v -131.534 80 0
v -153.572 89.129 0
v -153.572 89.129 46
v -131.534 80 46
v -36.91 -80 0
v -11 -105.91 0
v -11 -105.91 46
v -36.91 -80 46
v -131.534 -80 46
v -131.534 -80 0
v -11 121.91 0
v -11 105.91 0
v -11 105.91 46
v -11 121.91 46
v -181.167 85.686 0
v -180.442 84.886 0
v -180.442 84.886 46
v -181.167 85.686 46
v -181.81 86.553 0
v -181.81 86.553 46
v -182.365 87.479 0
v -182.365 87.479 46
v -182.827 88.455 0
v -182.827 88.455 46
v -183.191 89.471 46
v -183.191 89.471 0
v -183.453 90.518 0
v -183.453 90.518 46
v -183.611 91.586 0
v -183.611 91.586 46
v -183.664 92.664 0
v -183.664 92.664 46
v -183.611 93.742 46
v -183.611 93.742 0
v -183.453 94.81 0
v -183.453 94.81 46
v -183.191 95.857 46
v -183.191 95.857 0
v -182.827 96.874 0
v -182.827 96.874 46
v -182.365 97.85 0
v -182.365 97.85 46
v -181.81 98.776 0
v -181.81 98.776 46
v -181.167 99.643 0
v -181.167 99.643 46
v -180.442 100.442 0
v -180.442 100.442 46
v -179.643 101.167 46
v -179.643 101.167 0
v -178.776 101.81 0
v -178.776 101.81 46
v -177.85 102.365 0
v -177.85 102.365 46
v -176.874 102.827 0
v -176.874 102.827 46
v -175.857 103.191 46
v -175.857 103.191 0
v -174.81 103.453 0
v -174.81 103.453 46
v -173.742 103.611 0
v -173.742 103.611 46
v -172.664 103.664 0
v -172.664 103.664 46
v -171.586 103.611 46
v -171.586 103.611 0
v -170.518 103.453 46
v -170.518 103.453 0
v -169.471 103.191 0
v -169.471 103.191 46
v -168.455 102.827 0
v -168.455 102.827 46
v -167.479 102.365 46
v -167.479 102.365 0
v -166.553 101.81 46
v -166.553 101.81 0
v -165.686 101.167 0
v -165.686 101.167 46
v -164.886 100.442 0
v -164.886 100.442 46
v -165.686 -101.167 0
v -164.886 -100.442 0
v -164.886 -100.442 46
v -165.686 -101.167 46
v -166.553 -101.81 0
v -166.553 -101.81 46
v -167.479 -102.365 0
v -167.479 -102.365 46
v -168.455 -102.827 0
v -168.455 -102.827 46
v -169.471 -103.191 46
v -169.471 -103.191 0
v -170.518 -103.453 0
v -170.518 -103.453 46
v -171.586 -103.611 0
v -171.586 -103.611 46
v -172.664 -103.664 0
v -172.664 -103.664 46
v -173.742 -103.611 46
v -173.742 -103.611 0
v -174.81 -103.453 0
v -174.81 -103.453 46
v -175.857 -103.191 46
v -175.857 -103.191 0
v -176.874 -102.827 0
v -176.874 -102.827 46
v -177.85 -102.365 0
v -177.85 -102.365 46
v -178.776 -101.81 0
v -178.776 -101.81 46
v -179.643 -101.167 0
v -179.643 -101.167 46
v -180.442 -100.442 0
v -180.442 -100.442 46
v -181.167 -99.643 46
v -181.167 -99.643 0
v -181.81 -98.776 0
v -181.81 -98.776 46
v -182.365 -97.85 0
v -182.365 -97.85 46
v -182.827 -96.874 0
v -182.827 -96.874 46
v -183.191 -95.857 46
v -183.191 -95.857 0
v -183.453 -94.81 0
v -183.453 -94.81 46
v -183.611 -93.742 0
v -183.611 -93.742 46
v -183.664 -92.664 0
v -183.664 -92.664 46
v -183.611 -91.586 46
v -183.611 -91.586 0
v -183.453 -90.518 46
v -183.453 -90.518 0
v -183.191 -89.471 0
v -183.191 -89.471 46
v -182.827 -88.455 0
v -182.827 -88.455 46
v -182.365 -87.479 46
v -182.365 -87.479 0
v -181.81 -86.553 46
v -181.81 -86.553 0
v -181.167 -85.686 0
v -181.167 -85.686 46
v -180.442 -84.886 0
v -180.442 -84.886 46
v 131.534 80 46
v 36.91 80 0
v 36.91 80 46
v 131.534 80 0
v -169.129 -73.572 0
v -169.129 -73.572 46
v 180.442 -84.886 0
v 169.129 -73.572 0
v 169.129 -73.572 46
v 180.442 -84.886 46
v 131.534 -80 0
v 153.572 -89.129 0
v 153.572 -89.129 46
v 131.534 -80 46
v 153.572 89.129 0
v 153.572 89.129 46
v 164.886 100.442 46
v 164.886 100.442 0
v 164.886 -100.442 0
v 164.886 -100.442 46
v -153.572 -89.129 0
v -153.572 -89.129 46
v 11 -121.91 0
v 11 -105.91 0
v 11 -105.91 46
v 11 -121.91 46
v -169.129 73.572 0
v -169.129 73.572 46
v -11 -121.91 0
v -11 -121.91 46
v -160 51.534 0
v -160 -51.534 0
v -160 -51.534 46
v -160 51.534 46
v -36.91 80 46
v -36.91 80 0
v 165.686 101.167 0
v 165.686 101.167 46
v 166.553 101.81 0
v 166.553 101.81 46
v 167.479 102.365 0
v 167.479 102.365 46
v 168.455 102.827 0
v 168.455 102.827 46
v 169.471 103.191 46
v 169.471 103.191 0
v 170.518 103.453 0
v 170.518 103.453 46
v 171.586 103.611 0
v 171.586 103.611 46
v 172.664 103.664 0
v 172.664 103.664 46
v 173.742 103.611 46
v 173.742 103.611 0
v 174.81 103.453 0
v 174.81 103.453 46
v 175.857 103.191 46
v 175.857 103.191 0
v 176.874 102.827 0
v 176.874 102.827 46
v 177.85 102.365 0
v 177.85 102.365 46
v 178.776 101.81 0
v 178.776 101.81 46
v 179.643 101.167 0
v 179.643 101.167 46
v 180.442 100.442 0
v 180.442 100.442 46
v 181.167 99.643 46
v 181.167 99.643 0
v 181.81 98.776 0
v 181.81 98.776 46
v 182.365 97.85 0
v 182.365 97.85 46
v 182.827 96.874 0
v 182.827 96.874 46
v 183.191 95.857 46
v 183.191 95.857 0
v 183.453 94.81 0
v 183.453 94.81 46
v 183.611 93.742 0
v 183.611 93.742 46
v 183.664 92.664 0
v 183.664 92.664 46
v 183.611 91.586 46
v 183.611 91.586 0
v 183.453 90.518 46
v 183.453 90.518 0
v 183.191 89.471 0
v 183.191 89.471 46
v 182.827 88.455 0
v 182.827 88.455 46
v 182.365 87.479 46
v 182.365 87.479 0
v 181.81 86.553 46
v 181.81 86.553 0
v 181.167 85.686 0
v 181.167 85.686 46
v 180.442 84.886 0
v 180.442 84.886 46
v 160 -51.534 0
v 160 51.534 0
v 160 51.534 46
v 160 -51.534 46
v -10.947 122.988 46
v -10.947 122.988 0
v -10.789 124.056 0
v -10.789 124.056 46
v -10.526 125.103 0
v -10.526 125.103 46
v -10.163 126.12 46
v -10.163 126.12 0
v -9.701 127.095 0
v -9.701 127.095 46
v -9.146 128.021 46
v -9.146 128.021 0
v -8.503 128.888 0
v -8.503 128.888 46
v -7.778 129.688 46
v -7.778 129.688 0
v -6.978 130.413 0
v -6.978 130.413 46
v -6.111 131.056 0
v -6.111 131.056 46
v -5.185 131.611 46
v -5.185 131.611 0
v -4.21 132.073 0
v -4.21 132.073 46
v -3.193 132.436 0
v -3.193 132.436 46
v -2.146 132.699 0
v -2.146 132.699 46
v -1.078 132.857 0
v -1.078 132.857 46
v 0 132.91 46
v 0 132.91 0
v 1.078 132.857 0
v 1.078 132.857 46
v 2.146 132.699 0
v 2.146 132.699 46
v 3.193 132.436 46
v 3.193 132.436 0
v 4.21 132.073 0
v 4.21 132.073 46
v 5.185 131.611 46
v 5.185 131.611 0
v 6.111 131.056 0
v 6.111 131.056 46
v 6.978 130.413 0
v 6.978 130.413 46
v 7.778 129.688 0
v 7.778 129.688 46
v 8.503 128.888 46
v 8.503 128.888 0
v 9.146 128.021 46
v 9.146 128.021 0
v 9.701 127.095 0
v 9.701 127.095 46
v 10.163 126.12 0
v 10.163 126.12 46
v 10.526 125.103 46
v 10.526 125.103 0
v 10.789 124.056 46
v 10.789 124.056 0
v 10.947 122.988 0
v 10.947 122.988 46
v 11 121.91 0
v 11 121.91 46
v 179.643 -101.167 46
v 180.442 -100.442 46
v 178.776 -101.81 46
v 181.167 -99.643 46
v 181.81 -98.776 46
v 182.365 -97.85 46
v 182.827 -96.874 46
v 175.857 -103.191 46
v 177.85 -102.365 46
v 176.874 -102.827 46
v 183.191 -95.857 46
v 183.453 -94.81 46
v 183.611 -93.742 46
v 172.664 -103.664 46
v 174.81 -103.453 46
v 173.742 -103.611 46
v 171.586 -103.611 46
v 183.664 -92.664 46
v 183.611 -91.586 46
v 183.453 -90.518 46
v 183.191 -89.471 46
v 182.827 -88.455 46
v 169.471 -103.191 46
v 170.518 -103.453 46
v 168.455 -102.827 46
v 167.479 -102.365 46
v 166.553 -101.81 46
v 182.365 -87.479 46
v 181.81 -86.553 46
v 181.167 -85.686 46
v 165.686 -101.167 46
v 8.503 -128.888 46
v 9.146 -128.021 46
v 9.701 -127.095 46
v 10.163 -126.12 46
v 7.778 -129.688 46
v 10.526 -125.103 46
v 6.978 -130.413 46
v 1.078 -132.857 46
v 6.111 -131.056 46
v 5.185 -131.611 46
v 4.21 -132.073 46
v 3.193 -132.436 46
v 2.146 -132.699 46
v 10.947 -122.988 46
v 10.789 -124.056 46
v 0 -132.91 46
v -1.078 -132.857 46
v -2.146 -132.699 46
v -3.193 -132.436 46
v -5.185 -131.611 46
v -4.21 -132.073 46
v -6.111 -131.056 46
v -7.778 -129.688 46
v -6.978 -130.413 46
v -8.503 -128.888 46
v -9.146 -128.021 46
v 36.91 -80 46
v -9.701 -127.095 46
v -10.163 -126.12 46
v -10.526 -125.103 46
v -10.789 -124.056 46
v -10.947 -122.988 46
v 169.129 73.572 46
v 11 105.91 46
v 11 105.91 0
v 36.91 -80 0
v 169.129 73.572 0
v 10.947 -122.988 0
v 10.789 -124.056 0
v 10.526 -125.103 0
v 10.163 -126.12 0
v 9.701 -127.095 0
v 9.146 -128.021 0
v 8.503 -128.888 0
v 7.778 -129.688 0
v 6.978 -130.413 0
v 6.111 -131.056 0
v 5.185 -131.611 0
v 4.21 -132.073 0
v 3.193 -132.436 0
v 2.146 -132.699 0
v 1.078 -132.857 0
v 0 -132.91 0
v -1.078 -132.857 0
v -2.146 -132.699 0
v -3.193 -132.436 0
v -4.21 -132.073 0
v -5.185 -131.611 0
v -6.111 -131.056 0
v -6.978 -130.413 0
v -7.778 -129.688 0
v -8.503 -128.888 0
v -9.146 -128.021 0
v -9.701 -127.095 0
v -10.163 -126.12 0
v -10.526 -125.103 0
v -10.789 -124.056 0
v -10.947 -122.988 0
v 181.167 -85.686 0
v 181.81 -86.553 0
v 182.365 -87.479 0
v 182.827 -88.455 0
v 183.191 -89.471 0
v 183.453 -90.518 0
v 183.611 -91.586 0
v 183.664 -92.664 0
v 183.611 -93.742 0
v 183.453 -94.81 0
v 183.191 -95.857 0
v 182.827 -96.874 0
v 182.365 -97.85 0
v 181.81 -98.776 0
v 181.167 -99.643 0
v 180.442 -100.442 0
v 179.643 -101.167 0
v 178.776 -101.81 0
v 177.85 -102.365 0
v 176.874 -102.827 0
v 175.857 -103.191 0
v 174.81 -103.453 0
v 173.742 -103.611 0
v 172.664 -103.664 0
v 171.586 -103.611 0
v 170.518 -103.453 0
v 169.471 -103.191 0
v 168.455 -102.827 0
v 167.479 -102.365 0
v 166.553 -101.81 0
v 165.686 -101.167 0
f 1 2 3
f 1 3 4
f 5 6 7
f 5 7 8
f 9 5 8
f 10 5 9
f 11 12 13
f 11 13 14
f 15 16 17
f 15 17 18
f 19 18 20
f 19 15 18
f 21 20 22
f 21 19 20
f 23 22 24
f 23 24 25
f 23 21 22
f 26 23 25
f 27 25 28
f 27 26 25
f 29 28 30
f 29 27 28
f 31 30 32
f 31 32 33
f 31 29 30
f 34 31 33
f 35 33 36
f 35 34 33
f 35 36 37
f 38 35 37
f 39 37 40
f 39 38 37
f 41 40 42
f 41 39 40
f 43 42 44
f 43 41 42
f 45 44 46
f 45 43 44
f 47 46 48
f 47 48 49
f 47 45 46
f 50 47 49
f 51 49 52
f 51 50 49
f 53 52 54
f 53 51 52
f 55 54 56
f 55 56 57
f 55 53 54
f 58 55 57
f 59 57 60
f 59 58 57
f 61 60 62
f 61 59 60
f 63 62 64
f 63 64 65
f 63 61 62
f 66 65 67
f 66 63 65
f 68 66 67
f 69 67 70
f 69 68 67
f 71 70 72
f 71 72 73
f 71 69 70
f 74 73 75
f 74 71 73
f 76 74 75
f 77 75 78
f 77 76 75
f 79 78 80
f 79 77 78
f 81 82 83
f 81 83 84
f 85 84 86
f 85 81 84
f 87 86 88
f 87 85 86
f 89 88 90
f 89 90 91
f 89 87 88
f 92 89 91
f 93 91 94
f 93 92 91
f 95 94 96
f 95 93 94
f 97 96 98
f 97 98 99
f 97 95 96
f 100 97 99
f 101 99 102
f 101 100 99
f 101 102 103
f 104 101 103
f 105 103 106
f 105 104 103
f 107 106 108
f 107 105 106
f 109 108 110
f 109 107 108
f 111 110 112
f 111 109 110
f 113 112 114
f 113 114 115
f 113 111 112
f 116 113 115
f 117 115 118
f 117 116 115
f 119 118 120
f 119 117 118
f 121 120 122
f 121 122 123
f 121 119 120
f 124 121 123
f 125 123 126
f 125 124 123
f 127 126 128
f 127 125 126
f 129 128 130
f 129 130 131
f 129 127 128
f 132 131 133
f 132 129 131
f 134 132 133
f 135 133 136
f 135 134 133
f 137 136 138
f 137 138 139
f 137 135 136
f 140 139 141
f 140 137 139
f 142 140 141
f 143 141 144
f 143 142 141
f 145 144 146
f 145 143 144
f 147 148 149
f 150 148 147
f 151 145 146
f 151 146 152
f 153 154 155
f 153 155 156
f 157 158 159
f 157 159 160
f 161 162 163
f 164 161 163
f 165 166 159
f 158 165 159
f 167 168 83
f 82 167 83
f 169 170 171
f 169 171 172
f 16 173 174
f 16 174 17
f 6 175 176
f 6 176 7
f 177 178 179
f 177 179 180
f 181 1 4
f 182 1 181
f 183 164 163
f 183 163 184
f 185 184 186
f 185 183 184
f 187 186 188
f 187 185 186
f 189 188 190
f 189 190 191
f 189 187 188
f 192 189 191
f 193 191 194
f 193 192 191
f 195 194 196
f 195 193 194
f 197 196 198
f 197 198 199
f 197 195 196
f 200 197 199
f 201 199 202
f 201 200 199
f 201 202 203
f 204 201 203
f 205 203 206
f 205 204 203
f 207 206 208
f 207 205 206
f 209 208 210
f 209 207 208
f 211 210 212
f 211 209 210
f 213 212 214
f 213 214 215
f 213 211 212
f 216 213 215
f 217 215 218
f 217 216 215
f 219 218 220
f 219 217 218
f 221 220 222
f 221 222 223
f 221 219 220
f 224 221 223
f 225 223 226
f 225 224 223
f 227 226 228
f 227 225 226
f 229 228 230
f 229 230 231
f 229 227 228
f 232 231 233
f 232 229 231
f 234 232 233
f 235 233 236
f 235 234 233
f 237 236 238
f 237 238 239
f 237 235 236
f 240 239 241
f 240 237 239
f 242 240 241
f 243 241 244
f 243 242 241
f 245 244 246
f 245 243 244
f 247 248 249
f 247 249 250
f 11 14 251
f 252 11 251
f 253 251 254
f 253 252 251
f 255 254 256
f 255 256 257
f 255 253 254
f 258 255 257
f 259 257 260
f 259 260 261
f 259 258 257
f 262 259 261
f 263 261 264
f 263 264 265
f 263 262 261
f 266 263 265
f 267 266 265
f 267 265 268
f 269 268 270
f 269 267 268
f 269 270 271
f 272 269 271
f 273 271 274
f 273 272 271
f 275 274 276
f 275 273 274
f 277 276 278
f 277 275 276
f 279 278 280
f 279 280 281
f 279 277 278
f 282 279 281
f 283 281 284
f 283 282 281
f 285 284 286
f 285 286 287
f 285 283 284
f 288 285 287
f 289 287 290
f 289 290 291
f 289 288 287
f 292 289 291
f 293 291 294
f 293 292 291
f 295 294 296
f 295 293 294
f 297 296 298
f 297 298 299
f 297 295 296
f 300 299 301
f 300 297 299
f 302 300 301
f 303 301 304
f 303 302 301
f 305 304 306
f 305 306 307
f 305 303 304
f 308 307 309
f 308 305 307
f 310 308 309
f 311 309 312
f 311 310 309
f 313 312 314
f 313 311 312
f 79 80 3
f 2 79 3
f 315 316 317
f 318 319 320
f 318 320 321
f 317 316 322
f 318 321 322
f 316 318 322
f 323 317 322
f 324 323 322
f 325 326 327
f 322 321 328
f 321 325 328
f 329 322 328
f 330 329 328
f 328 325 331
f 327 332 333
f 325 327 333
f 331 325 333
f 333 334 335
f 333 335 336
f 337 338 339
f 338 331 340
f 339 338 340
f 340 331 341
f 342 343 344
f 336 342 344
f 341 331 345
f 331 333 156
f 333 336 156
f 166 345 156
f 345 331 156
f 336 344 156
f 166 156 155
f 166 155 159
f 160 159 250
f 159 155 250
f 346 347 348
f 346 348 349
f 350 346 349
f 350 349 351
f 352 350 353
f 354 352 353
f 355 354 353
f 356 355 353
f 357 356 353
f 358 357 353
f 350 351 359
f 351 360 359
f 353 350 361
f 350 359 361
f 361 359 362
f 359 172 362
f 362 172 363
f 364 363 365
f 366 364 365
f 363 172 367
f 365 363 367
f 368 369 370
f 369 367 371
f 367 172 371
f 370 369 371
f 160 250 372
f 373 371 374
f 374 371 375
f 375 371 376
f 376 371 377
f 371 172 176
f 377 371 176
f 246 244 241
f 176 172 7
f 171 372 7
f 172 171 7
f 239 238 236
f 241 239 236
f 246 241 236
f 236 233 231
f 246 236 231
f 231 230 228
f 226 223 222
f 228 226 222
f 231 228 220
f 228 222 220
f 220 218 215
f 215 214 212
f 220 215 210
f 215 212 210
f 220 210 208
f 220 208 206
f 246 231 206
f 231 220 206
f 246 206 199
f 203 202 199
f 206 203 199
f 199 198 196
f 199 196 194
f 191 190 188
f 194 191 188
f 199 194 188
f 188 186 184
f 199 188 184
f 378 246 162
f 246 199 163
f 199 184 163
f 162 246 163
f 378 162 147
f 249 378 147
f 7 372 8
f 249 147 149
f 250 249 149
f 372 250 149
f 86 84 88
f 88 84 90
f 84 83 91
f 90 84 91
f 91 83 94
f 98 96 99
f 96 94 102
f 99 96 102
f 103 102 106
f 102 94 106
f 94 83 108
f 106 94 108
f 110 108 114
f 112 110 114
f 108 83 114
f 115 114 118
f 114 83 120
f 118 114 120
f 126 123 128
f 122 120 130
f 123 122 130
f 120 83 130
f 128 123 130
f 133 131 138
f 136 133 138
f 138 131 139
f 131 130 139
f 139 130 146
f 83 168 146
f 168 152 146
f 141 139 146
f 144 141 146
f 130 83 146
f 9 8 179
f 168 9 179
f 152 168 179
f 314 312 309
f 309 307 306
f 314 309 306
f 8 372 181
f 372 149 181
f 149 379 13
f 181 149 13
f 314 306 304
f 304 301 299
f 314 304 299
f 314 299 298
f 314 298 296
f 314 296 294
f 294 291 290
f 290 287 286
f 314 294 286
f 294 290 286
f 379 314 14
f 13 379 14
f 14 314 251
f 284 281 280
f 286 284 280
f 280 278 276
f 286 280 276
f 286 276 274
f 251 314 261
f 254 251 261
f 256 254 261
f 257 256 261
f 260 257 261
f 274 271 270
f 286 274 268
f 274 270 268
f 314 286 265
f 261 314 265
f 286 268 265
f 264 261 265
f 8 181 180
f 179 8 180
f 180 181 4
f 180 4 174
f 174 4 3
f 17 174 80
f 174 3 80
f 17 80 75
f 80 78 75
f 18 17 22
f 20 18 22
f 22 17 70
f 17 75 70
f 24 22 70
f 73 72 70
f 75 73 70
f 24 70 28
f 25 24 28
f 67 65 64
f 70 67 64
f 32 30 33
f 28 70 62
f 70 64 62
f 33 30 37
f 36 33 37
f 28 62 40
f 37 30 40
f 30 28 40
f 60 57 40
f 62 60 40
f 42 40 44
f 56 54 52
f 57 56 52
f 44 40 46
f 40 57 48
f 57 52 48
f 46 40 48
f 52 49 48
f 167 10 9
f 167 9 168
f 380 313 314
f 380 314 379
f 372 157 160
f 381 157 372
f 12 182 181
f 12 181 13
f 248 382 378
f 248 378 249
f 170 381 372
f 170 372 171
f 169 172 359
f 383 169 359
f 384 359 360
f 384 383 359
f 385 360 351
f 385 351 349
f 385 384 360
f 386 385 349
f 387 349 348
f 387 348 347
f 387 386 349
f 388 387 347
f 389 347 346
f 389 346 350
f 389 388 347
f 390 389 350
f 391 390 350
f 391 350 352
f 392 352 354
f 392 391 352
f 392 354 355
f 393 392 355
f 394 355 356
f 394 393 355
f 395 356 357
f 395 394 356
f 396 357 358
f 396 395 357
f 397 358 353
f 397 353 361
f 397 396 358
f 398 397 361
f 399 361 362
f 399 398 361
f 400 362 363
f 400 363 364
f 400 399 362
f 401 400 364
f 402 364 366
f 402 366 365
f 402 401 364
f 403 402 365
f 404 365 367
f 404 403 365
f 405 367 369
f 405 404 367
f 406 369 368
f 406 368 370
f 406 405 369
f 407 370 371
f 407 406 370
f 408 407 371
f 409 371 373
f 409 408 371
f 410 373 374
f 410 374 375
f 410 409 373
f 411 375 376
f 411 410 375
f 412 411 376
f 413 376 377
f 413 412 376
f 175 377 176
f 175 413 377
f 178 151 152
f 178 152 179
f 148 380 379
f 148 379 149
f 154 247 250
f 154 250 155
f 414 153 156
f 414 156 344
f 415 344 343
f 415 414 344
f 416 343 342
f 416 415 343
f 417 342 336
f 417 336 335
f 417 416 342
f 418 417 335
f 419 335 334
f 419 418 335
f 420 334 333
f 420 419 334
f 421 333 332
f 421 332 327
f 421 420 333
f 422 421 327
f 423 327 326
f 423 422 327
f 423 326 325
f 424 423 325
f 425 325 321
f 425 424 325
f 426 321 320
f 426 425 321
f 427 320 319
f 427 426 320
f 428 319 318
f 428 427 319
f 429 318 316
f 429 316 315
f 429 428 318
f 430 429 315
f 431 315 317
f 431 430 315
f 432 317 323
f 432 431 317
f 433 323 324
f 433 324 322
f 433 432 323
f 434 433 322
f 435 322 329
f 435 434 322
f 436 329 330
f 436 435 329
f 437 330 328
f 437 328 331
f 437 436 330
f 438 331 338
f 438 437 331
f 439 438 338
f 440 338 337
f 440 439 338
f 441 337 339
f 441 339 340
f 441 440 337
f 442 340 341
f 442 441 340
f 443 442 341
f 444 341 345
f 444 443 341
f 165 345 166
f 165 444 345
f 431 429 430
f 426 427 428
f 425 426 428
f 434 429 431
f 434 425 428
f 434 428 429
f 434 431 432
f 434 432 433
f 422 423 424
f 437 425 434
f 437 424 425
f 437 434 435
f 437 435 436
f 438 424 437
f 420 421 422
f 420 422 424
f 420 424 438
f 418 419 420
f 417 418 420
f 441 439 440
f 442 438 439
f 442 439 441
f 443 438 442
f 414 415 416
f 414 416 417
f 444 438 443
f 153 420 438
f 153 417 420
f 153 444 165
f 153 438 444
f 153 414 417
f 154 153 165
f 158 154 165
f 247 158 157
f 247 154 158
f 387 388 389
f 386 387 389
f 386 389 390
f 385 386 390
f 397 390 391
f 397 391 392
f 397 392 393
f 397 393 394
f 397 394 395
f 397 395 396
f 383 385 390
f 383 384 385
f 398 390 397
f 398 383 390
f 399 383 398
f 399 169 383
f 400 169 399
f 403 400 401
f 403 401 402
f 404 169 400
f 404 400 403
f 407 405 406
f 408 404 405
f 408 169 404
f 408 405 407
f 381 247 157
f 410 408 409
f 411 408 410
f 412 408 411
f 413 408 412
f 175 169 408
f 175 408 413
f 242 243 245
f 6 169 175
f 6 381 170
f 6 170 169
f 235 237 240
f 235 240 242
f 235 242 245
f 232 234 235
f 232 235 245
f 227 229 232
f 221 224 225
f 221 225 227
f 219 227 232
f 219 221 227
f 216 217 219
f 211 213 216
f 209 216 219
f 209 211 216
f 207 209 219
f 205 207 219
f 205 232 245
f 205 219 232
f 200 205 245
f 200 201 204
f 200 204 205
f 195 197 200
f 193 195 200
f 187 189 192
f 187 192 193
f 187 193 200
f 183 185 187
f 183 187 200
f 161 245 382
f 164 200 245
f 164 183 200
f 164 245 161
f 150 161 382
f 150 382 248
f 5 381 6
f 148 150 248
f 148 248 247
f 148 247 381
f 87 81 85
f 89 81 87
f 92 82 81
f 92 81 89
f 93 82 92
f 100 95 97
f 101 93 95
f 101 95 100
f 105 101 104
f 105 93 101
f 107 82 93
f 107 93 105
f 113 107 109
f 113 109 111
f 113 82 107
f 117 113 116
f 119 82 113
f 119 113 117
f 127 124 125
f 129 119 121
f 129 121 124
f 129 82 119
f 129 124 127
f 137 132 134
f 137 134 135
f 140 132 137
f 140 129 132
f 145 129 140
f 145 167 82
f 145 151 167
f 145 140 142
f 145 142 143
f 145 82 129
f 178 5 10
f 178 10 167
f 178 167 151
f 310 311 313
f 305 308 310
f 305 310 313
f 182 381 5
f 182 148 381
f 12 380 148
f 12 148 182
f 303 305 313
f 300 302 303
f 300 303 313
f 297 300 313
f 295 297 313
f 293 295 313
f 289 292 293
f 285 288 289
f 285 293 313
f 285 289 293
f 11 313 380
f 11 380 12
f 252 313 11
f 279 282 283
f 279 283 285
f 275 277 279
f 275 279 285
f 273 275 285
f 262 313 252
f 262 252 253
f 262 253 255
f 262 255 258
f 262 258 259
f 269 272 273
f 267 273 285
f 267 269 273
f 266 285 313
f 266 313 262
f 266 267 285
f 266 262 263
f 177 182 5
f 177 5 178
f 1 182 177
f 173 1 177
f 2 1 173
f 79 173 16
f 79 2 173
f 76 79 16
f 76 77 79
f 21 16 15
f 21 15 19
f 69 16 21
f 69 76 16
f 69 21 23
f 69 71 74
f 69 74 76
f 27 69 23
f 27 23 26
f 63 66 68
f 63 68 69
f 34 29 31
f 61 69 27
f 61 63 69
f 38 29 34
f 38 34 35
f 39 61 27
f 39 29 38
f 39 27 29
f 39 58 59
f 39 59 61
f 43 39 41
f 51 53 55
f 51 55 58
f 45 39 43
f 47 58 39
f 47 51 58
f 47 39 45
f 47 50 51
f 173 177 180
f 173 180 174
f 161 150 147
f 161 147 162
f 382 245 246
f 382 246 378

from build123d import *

# Parameters (mm, degrees)
EXTRUDE_3_DEPTH = 46


with BuildPart() as part:
    # Эскиз3 → Бобышка-Вытянуть3 (new body)
    with BuildSketch(Plane.XY):
        with BuildLine():
            Line((11, 121.91), (11, 105.91))
            Line((11, 105.91), (36.91, 80))
            Line((36.91, 80), (131.533650814, 80))
            Line((131.533650814, 80), (153.572399359, 89.128748545))
            Line((153.572399359, 89.128748545), (164.886107858, 100.442457044))
            ThreePointArc((164.886107858, 100.442457044), (180.442457044, 100.442457044), (180.442457044, 84.886107858))
            Line((180.442457044, 84.886107858), (169.128748545, 73.572399359))
            Line((169.128748545, 73.572399359), (160, 51.533650814))
            Line((160, 51.533650814), (160, -51.533650814))
            Line((160, -51.533650814), (169.128748545, -73.572399359))
            Line((169.128748545, -73.572399359), (180.442457044, -84.886107858))
            ThreePointArc((180.442457044, -84.886107858), (180.442457044, -100.442457044), (164.886107858, -100.442457044))
            Line((164.886107858, -100.442457044), (153.572399359, -89.128748545))
            Line((153.572399359, -89.128748545), (131.533650814, -80))
            Line((131.533650814, -80), (36.91, -80))
            Line((36.91, -80), (11, -105.91))
            Line((11, -105.91), (11, -121.91))
            ThreePointArc((11, -121.91), (0, -132.91), (-11, -121.91))
            Line((-11, -121.91), (-11, -105.91))
            Line((-11, -105.91), (-36.91, -80))
            Line((-36.91, -80), (-131.533650814, -80))
            Line((-131.533650814, -80), (-153.572399359, -89.128748545))
            Line((-153.572399359, -89.128748545), (-164.886107858, -100.442457044))
            ThreePointArc((-164.886107858, -100.442457044), (-180.442457044, -100.442457044), (-180.442457044, -84.886107858))
            Line((-180.442457044, -84.886107858), (-169.128748545, -73.572399359))
            Line((-169.128748545, -73.572399359), (-160, -51.533650814))
            Line((-160, -51.533650814), (-160, 51.533650814))
            Line((-160, 51.533650814), (-169.128748545, 73.572399359))
            Line((-169.128748545, 73.572399359), (-180.442457044, 84.886107858))
            ThreePointArc((-180.442457044, 84.886107858), (-180.442457044, 100.442457044), (-164.886107858, 100.442457044))
            Line((-164.886107858, 100.442457044), (-153.572399359, 89.128748545))
            Line((-153.572399359, 89.128748545), (-131.533650814, 80))
            Line((-131.533650814, 80), (-36.91, 80))
            Line((-36.91, 80), (-11, 105.91))
            Line((-11, 105.91), (-11, 121.91))
            ThreePointArc((-11, 121.91), (0, 132.91), (11, 121.91))
        make_face()
    extrude(amount=EXTRUDE_3_DEPTH)


solid = part.part
